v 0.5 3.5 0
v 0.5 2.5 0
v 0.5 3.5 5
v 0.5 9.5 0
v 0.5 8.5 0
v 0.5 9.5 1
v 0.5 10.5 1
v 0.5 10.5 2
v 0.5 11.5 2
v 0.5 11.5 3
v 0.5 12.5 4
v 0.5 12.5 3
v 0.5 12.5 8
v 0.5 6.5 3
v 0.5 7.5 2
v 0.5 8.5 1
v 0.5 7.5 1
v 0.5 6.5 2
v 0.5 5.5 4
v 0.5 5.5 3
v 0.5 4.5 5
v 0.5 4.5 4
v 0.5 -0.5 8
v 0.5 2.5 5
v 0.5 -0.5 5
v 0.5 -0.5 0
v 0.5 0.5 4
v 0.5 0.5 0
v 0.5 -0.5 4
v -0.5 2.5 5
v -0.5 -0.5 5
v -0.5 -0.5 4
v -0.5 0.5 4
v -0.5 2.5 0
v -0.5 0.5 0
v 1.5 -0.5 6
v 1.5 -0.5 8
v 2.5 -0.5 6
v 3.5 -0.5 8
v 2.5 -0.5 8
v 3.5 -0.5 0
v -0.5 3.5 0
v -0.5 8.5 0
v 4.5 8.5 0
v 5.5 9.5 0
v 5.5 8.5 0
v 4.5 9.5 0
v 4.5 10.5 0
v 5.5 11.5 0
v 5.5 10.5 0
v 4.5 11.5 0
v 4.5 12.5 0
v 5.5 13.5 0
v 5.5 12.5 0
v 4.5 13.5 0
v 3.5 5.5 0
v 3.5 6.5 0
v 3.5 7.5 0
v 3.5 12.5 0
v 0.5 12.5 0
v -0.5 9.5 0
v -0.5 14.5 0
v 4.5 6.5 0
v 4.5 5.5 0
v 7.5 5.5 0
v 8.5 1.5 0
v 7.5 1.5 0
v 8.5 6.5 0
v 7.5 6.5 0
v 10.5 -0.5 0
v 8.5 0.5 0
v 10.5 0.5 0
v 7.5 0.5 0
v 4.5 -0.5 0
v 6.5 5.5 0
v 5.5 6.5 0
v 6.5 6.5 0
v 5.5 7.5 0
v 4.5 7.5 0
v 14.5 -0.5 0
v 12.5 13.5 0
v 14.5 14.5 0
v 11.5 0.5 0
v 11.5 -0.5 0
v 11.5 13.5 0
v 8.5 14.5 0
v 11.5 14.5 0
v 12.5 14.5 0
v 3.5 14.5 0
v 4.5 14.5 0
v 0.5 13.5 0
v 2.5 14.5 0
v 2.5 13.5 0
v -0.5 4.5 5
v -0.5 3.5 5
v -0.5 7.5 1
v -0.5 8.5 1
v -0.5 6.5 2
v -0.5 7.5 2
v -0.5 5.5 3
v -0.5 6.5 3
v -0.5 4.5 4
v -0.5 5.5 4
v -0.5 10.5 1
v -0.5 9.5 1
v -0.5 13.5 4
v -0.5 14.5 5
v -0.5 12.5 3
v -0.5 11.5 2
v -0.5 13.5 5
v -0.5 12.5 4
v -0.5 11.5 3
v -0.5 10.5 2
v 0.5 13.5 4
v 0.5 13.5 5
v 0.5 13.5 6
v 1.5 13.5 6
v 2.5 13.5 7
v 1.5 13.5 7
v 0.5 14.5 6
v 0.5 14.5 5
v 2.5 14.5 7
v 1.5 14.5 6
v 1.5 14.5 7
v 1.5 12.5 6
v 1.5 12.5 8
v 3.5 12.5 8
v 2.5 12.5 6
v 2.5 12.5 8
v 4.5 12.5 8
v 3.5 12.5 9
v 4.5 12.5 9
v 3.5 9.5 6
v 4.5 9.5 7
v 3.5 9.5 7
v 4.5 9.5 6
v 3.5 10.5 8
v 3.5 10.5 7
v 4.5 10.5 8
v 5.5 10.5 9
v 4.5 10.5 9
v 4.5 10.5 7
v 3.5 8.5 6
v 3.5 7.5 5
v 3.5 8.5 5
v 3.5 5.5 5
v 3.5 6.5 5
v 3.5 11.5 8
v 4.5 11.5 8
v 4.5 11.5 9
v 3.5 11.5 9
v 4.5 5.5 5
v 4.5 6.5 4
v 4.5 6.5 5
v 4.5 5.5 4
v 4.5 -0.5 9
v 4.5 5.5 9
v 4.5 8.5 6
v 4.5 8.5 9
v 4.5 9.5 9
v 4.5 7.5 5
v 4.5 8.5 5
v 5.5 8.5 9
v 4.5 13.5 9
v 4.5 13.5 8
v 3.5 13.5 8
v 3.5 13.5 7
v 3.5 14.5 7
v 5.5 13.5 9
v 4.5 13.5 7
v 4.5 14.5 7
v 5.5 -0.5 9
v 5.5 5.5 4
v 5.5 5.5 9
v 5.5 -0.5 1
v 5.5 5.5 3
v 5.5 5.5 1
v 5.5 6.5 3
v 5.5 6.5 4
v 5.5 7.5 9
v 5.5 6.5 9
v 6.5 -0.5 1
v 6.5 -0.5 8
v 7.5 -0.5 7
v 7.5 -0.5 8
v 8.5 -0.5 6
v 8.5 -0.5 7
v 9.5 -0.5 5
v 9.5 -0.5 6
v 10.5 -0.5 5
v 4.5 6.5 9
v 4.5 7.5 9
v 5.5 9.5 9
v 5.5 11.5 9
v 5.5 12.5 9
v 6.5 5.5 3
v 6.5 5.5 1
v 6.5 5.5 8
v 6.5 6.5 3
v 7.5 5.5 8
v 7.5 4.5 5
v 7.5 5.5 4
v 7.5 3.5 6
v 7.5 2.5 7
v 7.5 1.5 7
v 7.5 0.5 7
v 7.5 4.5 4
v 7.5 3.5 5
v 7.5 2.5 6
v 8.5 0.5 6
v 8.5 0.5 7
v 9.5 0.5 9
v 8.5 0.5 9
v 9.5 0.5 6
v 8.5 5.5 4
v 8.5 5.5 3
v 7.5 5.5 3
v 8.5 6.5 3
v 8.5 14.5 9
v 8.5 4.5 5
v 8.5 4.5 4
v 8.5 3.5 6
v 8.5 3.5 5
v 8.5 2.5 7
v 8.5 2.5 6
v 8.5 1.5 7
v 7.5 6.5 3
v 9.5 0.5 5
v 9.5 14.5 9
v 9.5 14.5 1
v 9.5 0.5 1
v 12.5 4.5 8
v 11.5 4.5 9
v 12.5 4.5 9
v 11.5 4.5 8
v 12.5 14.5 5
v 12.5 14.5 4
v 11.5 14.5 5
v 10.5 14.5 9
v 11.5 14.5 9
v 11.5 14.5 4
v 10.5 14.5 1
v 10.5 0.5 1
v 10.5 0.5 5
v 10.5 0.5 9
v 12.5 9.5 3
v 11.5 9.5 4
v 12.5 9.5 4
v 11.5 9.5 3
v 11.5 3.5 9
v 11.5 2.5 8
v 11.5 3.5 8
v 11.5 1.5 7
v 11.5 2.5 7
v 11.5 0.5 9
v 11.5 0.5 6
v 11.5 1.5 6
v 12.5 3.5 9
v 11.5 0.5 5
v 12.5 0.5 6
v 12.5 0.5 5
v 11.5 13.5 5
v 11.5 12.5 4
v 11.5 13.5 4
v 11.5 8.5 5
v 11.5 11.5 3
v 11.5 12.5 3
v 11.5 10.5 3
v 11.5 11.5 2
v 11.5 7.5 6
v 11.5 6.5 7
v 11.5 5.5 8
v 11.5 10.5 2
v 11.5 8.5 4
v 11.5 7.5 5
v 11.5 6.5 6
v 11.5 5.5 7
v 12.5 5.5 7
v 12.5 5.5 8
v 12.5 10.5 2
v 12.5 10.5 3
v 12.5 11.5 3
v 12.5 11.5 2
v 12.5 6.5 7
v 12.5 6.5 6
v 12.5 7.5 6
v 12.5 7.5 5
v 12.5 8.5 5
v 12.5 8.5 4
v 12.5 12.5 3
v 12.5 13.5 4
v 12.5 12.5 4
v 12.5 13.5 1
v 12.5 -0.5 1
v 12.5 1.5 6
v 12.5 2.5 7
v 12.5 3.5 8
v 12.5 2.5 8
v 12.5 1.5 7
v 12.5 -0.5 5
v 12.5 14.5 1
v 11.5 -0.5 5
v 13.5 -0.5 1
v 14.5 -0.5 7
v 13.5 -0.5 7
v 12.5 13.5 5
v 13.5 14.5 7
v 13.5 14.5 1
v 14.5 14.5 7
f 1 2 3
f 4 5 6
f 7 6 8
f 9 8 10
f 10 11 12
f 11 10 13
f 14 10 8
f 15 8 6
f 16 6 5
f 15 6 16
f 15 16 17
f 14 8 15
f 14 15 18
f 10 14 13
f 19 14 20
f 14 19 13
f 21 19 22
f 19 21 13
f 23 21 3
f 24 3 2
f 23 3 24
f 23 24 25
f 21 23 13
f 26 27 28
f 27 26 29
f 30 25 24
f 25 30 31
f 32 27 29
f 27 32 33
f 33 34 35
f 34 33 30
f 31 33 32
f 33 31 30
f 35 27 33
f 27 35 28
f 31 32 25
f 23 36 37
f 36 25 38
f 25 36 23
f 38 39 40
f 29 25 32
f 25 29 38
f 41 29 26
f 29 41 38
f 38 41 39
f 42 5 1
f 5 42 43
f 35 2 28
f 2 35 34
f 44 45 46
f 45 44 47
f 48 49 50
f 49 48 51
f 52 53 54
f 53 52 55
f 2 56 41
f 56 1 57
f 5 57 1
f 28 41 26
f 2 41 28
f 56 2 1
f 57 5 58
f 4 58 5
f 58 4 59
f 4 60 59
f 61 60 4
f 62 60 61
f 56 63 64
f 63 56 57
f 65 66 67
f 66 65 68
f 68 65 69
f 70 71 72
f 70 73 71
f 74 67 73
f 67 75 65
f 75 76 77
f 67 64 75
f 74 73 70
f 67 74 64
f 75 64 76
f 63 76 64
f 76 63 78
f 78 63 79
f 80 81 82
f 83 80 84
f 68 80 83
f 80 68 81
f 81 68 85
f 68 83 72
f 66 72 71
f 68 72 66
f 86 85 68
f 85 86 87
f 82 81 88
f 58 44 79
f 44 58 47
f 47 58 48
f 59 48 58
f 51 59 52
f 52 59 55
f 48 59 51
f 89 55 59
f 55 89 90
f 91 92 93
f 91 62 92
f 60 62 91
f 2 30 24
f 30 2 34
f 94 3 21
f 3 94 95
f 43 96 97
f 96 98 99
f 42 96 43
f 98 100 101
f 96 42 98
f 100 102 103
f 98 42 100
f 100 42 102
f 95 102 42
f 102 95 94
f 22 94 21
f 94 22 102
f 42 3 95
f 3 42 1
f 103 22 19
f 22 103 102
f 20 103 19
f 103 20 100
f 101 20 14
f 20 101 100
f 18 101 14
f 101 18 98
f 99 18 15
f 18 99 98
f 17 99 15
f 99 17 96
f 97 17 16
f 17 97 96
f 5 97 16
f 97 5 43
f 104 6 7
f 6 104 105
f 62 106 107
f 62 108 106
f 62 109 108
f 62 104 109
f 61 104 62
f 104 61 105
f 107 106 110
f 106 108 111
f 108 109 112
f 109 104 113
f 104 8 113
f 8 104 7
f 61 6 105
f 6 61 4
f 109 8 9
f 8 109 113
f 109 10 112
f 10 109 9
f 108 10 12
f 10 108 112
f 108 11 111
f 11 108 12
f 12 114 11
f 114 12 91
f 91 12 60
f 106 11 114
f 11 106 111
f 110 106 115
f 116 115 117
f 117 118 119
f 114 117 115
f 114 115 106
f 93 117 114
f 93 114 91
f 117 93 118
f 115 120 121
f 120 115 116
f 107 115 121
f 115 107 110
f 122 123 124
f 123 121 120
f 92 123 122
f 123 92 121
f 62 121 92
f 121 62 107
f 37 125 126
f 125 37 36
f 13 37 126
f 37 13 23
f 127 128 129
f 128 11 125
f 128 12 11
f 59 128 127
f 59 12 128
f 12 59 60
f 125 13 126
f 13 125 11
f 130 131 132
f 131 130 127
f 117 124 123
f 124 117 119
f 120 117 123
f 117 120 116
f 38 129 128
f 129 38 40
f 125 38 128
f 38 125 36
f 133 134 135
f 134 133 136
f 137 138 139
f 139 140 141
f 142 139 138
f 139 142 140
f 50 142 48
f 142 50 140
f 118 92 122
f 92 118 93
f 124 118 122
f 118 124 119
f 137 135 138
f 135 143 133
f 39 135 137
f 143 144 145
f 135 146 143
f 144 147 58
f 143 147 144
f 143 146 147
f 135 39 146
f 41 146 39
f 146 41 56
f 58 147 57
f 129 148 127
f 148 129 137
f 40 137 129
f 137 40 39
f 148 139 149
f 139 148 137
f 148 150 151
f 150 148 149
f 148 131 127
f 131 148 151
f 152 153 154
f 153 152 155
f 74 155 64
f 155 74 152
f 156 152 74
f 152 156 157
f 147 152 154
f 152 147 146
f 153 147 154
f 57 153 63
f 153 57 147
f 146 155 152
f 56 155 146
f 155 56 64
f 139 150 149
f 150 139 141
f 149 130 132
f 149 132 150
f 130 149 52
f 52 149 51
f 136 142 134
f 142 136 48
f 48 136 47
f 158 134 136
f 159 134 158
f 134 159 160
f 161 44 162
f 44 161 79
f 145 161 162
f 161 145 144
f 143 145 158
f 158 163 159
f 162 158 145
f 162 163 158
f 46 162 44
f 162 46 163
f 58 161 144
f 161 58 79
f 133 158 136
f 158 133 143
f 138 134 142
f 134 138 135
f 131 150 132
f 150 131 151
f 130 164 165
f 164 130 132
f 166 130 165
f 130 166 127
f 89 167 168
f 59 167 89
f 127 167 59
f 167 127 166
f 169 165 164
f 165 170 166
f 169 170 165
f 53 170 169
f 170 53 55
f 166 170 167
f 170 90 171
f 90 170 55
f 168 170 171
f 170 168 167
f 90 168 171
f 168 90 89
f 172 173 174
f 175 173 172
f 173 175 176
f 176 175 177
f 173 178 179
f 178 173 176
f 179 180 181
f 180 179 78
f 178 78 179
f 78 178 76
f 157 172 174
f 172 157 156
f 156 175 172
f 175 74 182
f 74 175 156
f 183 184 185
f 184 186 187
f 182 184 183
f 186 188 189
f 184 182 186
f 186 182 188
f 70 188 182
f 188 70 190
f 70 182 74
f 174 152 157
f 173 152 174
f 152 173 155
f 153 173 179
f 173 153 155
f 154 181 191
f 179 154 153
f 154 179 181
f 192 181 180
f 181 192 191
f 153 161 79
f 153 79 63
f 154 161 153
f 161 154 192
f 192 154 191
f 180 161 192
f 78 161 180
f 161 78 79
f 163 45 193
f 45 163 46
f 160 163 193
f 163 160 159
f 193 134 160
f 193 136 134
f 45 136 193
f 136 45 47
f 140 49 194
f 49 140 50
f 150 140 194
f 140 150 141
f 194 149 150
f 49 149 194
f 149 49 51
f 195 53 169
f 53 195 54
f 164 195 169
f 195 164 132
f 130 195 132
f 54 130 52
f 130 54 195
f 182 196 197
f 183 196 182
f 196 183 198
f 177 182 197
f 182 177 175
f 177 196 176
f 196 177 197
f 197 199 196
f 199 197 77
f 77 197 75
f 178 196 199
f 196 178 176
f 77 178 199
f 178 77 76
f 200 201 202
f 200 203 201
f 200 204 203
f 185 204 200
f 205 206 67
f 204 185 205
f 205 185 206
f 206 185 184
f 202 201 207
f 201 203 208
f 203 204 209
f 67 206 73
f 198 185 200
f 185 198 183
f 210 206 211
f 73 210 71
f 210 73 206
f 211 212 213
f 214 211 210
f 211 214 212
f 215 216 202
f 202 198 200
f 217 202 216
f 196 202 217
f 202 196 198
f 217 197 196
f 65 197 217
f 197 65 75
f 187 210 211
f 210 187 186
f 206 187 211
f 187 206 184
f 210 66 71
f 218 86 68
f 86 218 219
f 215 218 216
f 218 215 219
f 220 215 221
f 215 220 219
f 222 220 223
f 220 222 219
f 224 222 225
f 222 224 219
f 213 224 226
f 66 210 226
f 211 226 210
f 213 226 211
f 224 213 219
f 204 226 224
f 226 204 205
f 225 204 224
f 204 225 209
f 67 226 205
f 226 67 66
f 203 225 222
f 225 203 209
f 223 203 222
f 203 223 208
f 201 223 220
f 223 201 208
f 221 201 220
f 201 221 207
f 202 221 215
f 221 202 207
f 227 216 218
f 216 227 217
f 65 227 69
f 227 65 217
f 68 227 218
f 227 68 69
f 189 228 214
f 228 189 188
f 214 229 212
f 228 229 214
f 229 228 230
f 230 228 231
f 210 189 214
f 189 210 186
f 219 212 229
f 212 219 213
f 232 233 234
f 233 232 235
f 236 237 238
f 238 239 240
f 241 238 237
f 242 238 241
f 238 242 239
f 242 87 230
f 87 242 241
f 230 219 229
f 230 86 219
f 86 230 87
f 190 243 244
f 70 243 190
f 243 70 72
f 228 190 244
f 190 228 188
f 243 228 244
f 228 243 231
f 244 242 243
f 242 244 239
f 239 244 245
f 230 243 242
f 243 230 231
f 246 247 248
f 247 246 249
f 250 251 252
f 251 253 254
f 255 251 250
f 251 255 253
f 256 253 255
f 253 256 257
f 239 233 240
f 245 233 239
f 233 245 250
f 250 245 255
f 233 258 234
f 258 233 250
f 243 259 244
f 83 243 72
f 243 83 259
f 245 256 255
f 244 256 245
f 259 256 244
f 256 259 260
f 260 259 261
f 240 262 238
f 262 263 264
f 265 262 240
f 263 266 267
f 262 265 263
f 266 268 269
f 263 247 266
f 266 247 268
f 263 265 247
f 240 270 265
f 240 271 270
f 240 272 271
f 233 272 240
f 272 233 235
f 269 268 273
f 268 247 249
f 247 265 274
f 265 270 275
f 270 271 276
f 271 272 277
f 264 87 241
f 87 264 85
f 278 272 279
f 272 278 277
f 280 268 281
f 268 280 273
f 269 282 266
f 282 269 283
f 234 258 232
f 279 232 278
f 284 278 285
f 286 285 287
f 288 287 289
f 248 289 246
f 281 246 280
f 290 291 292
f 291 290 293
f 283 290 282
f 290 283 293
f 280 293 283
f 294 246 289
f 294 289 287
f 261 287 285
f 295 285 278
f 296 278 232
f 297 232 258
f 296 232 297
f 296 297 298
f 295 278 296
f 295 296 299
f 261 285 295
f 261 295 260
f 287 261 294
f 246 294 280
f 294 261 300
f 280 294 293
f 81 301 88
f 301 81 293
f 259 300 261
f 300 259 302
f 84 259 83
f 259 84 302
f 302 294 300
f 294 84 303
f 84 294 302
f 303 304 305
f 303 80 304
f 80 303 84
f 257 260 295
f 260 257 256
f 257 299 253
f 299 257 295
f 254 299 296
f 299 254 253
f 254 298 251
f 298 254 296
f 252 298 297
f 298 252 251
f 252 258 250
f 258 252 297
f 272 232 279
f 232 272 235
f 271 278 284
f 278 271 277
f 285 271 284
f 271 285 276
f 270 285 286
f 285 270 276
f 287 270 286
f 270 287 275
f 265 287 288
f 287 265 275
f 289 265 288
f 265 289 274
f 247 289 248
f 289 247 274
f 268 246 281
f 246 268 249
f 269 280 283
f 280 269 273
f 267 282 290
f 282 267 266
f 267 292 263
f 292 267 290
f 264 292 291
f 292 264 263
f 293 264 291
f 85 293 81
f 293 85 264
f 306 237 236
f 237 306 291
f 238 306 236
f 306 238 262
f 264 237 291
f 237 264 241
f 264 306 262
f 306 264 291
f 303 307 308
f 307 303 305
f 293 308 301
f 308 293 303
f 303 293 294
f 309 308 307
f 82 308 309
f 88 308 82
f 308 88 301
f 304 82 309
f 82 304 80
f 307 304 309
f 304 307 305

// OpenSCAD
union() {
    translate([0, 0, 4.5]) color([1, 0, 0]) cube([1, 1, 1], center=true);
    translate([0, 1, 2.5]) cube([1, 1, 5], center=true);
    translate([0, 2, 2.5]) cube([1, 1, 5], center=true);
    translate([0, 4, 2.5]) cube([1, 1, 5], center=true);
    translate([0, 5, 2.0]) cube([1, 1, 4], center=true);
    translate([0, 6, 1.5]) cube([1, 1, 3], center=true);
    translate([0, 7, 1.0]) cube([1, 1, 2], center=true);
    translate([0, 8, 0.5]) cube([1, 1, 1], center=true);
    translate([0, 10, 0.5]) cube([1, 1, 1], center=true);
    translate([0, 11, 1.0]) cube([1, 1, 2], center=true);
    translate([0, 12, 1.5]) cube([1, 1, 3], center=true);
    translate([0, 13, 2.0]) cube([1, 1, 4], center=true);
    translate([0, 14, 2.5]) cube([1, 1, 5], center=true);
    translate([1, 0, 4.0]) cube([1, 1, 8], center=true);
    translate([1, 1, 4.0]) cube([1, 1, 8], center=true);
    translate([1, 2, 4.0]) cube([1, 1, 8], center=true);
    translate([1, 3, 4.0]) cube([1, 1, 8], center=true);
    translate([1, 4, 4.0]) cube([1, 1, 8], center=true);
    translate([1, 5, 4.0]) cube([1, 1, 8], center=true);
    translate([1, 6, 4.0]) cube([1, 1, 8], center=true);
    translate([1, 7, 4.0]) cube([1, 1, 8], center=true);
    translate([1, 8, 4.0]) cube([1, 1, 8], center=true);
    translate([1, 9, 4.0]) cube([1, 1, 8], center=true);
    translate([1, 10, 4.0]) cube([1, 1, 8], center=true);
    translate([1, 11, 4.0]) cube([1, 1, 8], center=true);
    translate([1, 12, 4.0]) cube([1, 1, 8], center=true);
    translate([1, 14, 3.0]) cube([1, 1, 6], center=true);
    translate([2, 0, 3.0]) cube([1, 1, 6], center=true);
    translate([2, 1, 3.0]) cube([1, 1, 6], center=true);
    translate([2, 2, 3.0]) cube([1, 1, 6], center=true);
    translate([2, 3, 3.0]) cube([1, 1, 6], center=true);
    translate([2, 4, 3.0]) cube([1, 1, 6], center=true);
    translate([2, 5, 3.0]) cube([1, 1, 6], center=true);
    translate([2, 6, 3.0]) cube([1, 1, 6], center=true);
    translate([2, 7, 3.0]) cube([1, 1, 6], center=true);
    translate([2, 8, 3.0]) cube([1, 1, 6], center=true);
    translate([2, 9, 3.0]) cube([1, 1, 6], center=true);
    translate([2, 10, 3.0]) cube([1, 1, 6], center=true);
    translate([2, 11, 3.0]) cube([1, 1, 6], center=true);
    translate([2, 12, 3.0]) cube([1, 1, 6], center=true);
    translate([2, 14, 3.5]) cube([1, 1, 7], center=true);
    translate([3, 0, 4.0]) cube([1, 1, 8], center=true);
    translate([3, 1, 4.0]) cube([1, 1, 8], center=true);
    translate([3, 2, 4.0]) cube([1, 1, 8], center=true);
    translate([3, 3, 4.0]) cube([1, 1, 8], center=true);
    translate([3, 4, 4.0]) cube([1, 1, 8], center=true);
    translate([3, 5, 4.0]) cube([1, 1, 8], center=true);
    translate([3, 6, 4.0]) cube([1, 1, 8], center=true);
    translate([3, 7, 4.0]) cube([1, 1, 8], center=true);
    translate([3, 8, 4.0]) cube([1, 1, 8], center=true);
    translate([3, 9, 4.0]) cube([1, 1, 8], center=true);
    translate([3, 10, 4.0]) cube([1, 1, 8], center=true);
    translate([3, 11, 4.0]) cube([1, 1, 8], center=true);
    translate([3, 12, 4.0]) cube([1, 1, 8], center=true);
    translate([4, 6, 2.5]) cube([1, 1, 5], center=true);
    translate([4, 8, 2.5]) cube([1, 1, 5], center=true);
    translate([4, 9, 3.0]) cube([1, 1, 6], center=true);
    translate([4, 10, 3.5]) cube([1, 1, 7], center=true);
    translate([4, 11, 4.0]) cube([1, 1, 8], center=true);
    translate([4, 12, 4.5]) cube([1, 1, 9], center=true);
    translate([4, 13, 4.0]) cube([1, 1, 8], center=true);
    translate([4, 14, 3.5]) cube([1, 1, 7], center=true);
    translate([5, 0, 4.5]) cube([1, 1, 9], center=true);
    translate([5, 1, 4.5]) cube([1, 1, 9], center=true);
    translate([5, 2, 4.5]) cube([1, 1, 9], center=true);
    translate([5, 3, 4.5]) cube([1, 1, 9], center=true);
    translate([5, 4, 4.5]) cube([1, 1, 9], center=true);
    translate([5, 5, 4.5]) cube([1, 1, 9], center=true);
    translate([5, 6, 2.0]) cube([1, 1, 4], center=true);
    translate([5, 7, 4.5]) cube([1, 1, 9], center=true);
    translate([5, 9, 4.5]) cube([1, 1, 9], center=true);
    translate([5, 11, 4.5]) cube([1, 1, 9], center=true);
    translate([5, 13, 4.5]) cube([1, 1, 9], center=true);
    translate([6, 0, 0.5]) cube([1, 1, 1], center=true);
    translate([6, 1, 0.5]) cube([1, 1, 1], center=true);
    translate([6, 2, 0.5]) cube([1, 1, 1], center=true);
    translate([6, 3, 0.5]) cube([1, 1, 1], center=true);
    translate([6, 4, 0.5]) cube([1, 1, 1], center=true);
    translate([6, 5, 0.5]) cube([1, 1, 1], center=true);
    translate([6, 6, 1.5]) cube([1, 1, 3], center=true);
    translate([7, 0, 4.0]) cube([1, 1, 8], center=true);
    translate([7, 1, 4.0]) cube([1, 1, 8], center=true);
    translate([7, 2, 4.0]) cube([1, 1, 8], center=true);
    translate([7, 3, 4.0]) cube([1, 1, 8], center=true);
    translate([7, 4, 4.0]) cube([1, 1, 8], center=true);
    translate([7, 5, 4.0]) cube([1, 1, 8], center=true);
    translate([8, 0, 3.5]) cube([1, 1, 7], center=true);
    translate([8, 2, 3.5]) cube([1, 1, 7], center=true);
    translate([8, 3, 3.0]) cube([1, 1, 6], center=true);
    translate([8, 4, 2.5]) cube([1, 1, 5], center=true);
    translate([8, 5, 2.0]) cube([1, 1, 4], center=true);
    translate([8, 6, 1.5]) cube([1, 1, 3], center=true);
    translate([9, 0, 3.0]) cube([1, 1, 6], center=true);
    translate([9, 1, 4.5]) cube([1, 1, 9], center=true);
    translate([9, 2, 4.5]) cube([1, 1, 9], center=true);
    translate([9, 3, 4.5]) cube([1, 1, 9], center=true);
    translate([9, 4, 4.5]) cube([1, 1, 9], center=true);
    translate([9, 5, 4.5]) cube([1, 1, 9], center=true);
    translate([9, 6, 4.5]) cube([1, 1, 9], center=true);
    translate([9, 7, 4.5]) cube([1, 1, 9], center=true);
    translate([9, 8, 4.5]) cube([1, 1, 9], center=true);
    translate([9, 9, 4.5]) cube([1, 1, 9], center=true);
    translate([9, 10, 4.5]) cube([1, 1, 9], center=true);
    translate([9, 11, 4.5]) cube([1, 1, 9], center=true);
    translate([9, 12, 4.5]) cube([1, 1, 9], center=true);
    translate([9, 13, 4.5]) cube([1, 1, 9], center=true);
    translate([9, 14, 4.5]) cube([1, 1, 9], center=true);
    translate([10, 0, 2.5]) cube([1, 1, 5], center=true);
    translate([10, 1, 0.5]) cube([1, 1, 1], center=true);
    translate([10, 2, 0.5]) cube([1, 1, 1], center=true);
    translate([10, 3, 0.5]) cube([1, 1, 1], center=true);
    translate([10, 4, 0.5]) cube([1, 1, 1], center=true);
    translate([10, 5, 0.5]) cube([1, 1, 1], center=true);
    translate([10, 6, 0.5]) cube([1, 1, 1], center=true);
    translate([10, 7, 0.5]) cube([1, 1, 1], center=true);
    translate([10, 8, 0.5]) cube([1, 1, 1], center=true);
    translate([10, 9, 0.5]) cube([1, 1, 1], center=true);
    translate([10, 10, 0.5]) cube([1, 1, 1], center=true);
    translate([10, 11, 0.5]) cube([1, 1, 1], center=true);
    translate([10, 12, 0.5]) cube([1, 1, 1], center=true);
    translate([10, 13, 0.5]) cube([1, 1, 1], center=true);
    translate([10, 14, 0.5]) cube([1, 1, 1], center=true);
    translate([11, 1, 4.5]) cube([1, 1, 9], center=true);
    translate([11, 2, 4.5]) cube([1, 1, 9], center=true);
    translate([11, 3, 4.5]) cube([1, 1, 9], center=true);
    translate([11, 4, 4.5]) cube([1, 1, 9], center=true);
    translate([11, 5, 4.5]) cube([1, 1, 9], center=true);
    translate([11, 6, 4.5]) cube([1, 1, 9], center=true);
    translate([11, 7, 4.5]) cube([1, 1, 9], center=true);
    translate([11, 8, 4.5]) cube([1, 1, 9], center=true);
    translate([11, 9, 4.5]) cube([1, 1, 9], center=true);
    translate([11, 10, 4.5]) cube([1, 1, 9], center=true);
    translate([11, 11, 4.5]) cube([1, 1, 9], center=true);
    translate([11, 12, 4.5]) cube([1, 1, 9], center=true);
    translate([11, 13, 4.5]) cube([1, 1, 9], center=true);
    translate([11, 14, 4.5]) cube([1, 1, 9], center=true);
    translate([12, 0, 2.5]) cube([1, 1, 5], center=true);
    translate([12, 1, 3.0]) cube([1, 1, 6], center=true);
    translate([12, 2, 3.5]) cube([1, 1, 7], center=true);
    translate([12, 3, 4.0]) cube([1, 1, 8], center=true);
    translate([12, 4, 4.5]) cube([1, 1, 9], center=true);
    translate([12, 5, 4.0]) cube([1, 1, 8], center=true);
    translate([12, 6, 3.5]) cube([1, 1, 7], center=true);
    translate([12, 7, 3.0]) cube([1, 1, 6], center=true);
    translate([12, 8, 2.5]) cube([1, 1, 5], center=true);
    translate([12, 9, 2.0]) cube([1, 1, 4], center=true);
    translate([12, 10, 1.5]) cube([1, 1, 3], center=true);
    translate([12, 11, 1.0]) cube([1, 1, 2], center=true);
    translate([12, 12, 1.5]) cube([1, 1, 3], center=true);
    translate([12, 13, 2.0]) cube([1, 1, 4], center=true);
    translate([12, 14, 4.5]) color([0, 0, 1]) cube([1, 1, 1], center=true);
    translate([13, 0, 0.5]) cube([1, 1, 1], center=true);
    translate([13, 1, 0.5]) cube([1, 1, 1], center=true);
    translate([13, 2, 0.5]) cube([1, 1, 1], center=true);
    translate([13, 3, 0.5]) cube([1, 1, 1], center=true);
    translate([13, 4, 0.5]) cube([1, 1, 1], center=true);
    translate([13, 5, 0.5]) cube([1, 1, 1], center=true);
    translate([13, 6, 0.5]) cube([1, 1, 1], center=true);
    translate([13, 7, 0.5]) cube([1, 1, 1], center=true);
    translate([13, 8, 0.5]) cube([1, 1, 1], center=true);
    translate([13, 9, 0.5]) cube([1, 1, 1], center=true);
    translate([13, 10, 0.5]) cube([1, 1, 1], center=true);
    translate([13, 11, 0.5]) cube([1, 1, 1], center=true);
    translate([13, 12, 0.5]) cube([1, 1, 1], center=true);
    translate([13, 13, 0.5]) cube([1, 1, 1], center=true);
    translate([13, 14, 0.5]) cube([1, 1, 1], center=true);
    translate([14, 0, 3.5]) cube([1, 1, 7], center=true);
    translate([14, 1, 3.5]) cube([1, 1, 7], center=true);
    translate([14, 2, 3.5]) cube([1, 1, 7], center=true);
    translate([14, 3, 3.5]) cube([1, 1, 7], center=true);
    translate([14, 4, 3.5]) cube([1, 1, 7], center=true);
    translate([14, 5, 3.5]) cube([1, 1, 7], center=true);
    translate([14, 6, 3.5]) cube([1, 1, 7], center=true);
    translate([14, 7, 3.5]) cube([1, 1, 7], center=true);
    translate([14, 8, 3.5]) cube([1, 1, 7], center=true);
    translate([14, 9, 3.5]) cube([1, 1, 7], center=true);
    translate([14, 10, 3.5]) cube([1, 1, 7], center=true);
    translate([14, 11, 3.5]) cube([1, 1, 7], center=true);
    translate([14, 12, 3.5]) cube([1, 1, 7], center=true);
    translate([14, 13, 3.5]) cube([1, 1, 7], center=true);
    translate([14, 14, 3.5]) cube([1, 1, 7], center=true);
}
